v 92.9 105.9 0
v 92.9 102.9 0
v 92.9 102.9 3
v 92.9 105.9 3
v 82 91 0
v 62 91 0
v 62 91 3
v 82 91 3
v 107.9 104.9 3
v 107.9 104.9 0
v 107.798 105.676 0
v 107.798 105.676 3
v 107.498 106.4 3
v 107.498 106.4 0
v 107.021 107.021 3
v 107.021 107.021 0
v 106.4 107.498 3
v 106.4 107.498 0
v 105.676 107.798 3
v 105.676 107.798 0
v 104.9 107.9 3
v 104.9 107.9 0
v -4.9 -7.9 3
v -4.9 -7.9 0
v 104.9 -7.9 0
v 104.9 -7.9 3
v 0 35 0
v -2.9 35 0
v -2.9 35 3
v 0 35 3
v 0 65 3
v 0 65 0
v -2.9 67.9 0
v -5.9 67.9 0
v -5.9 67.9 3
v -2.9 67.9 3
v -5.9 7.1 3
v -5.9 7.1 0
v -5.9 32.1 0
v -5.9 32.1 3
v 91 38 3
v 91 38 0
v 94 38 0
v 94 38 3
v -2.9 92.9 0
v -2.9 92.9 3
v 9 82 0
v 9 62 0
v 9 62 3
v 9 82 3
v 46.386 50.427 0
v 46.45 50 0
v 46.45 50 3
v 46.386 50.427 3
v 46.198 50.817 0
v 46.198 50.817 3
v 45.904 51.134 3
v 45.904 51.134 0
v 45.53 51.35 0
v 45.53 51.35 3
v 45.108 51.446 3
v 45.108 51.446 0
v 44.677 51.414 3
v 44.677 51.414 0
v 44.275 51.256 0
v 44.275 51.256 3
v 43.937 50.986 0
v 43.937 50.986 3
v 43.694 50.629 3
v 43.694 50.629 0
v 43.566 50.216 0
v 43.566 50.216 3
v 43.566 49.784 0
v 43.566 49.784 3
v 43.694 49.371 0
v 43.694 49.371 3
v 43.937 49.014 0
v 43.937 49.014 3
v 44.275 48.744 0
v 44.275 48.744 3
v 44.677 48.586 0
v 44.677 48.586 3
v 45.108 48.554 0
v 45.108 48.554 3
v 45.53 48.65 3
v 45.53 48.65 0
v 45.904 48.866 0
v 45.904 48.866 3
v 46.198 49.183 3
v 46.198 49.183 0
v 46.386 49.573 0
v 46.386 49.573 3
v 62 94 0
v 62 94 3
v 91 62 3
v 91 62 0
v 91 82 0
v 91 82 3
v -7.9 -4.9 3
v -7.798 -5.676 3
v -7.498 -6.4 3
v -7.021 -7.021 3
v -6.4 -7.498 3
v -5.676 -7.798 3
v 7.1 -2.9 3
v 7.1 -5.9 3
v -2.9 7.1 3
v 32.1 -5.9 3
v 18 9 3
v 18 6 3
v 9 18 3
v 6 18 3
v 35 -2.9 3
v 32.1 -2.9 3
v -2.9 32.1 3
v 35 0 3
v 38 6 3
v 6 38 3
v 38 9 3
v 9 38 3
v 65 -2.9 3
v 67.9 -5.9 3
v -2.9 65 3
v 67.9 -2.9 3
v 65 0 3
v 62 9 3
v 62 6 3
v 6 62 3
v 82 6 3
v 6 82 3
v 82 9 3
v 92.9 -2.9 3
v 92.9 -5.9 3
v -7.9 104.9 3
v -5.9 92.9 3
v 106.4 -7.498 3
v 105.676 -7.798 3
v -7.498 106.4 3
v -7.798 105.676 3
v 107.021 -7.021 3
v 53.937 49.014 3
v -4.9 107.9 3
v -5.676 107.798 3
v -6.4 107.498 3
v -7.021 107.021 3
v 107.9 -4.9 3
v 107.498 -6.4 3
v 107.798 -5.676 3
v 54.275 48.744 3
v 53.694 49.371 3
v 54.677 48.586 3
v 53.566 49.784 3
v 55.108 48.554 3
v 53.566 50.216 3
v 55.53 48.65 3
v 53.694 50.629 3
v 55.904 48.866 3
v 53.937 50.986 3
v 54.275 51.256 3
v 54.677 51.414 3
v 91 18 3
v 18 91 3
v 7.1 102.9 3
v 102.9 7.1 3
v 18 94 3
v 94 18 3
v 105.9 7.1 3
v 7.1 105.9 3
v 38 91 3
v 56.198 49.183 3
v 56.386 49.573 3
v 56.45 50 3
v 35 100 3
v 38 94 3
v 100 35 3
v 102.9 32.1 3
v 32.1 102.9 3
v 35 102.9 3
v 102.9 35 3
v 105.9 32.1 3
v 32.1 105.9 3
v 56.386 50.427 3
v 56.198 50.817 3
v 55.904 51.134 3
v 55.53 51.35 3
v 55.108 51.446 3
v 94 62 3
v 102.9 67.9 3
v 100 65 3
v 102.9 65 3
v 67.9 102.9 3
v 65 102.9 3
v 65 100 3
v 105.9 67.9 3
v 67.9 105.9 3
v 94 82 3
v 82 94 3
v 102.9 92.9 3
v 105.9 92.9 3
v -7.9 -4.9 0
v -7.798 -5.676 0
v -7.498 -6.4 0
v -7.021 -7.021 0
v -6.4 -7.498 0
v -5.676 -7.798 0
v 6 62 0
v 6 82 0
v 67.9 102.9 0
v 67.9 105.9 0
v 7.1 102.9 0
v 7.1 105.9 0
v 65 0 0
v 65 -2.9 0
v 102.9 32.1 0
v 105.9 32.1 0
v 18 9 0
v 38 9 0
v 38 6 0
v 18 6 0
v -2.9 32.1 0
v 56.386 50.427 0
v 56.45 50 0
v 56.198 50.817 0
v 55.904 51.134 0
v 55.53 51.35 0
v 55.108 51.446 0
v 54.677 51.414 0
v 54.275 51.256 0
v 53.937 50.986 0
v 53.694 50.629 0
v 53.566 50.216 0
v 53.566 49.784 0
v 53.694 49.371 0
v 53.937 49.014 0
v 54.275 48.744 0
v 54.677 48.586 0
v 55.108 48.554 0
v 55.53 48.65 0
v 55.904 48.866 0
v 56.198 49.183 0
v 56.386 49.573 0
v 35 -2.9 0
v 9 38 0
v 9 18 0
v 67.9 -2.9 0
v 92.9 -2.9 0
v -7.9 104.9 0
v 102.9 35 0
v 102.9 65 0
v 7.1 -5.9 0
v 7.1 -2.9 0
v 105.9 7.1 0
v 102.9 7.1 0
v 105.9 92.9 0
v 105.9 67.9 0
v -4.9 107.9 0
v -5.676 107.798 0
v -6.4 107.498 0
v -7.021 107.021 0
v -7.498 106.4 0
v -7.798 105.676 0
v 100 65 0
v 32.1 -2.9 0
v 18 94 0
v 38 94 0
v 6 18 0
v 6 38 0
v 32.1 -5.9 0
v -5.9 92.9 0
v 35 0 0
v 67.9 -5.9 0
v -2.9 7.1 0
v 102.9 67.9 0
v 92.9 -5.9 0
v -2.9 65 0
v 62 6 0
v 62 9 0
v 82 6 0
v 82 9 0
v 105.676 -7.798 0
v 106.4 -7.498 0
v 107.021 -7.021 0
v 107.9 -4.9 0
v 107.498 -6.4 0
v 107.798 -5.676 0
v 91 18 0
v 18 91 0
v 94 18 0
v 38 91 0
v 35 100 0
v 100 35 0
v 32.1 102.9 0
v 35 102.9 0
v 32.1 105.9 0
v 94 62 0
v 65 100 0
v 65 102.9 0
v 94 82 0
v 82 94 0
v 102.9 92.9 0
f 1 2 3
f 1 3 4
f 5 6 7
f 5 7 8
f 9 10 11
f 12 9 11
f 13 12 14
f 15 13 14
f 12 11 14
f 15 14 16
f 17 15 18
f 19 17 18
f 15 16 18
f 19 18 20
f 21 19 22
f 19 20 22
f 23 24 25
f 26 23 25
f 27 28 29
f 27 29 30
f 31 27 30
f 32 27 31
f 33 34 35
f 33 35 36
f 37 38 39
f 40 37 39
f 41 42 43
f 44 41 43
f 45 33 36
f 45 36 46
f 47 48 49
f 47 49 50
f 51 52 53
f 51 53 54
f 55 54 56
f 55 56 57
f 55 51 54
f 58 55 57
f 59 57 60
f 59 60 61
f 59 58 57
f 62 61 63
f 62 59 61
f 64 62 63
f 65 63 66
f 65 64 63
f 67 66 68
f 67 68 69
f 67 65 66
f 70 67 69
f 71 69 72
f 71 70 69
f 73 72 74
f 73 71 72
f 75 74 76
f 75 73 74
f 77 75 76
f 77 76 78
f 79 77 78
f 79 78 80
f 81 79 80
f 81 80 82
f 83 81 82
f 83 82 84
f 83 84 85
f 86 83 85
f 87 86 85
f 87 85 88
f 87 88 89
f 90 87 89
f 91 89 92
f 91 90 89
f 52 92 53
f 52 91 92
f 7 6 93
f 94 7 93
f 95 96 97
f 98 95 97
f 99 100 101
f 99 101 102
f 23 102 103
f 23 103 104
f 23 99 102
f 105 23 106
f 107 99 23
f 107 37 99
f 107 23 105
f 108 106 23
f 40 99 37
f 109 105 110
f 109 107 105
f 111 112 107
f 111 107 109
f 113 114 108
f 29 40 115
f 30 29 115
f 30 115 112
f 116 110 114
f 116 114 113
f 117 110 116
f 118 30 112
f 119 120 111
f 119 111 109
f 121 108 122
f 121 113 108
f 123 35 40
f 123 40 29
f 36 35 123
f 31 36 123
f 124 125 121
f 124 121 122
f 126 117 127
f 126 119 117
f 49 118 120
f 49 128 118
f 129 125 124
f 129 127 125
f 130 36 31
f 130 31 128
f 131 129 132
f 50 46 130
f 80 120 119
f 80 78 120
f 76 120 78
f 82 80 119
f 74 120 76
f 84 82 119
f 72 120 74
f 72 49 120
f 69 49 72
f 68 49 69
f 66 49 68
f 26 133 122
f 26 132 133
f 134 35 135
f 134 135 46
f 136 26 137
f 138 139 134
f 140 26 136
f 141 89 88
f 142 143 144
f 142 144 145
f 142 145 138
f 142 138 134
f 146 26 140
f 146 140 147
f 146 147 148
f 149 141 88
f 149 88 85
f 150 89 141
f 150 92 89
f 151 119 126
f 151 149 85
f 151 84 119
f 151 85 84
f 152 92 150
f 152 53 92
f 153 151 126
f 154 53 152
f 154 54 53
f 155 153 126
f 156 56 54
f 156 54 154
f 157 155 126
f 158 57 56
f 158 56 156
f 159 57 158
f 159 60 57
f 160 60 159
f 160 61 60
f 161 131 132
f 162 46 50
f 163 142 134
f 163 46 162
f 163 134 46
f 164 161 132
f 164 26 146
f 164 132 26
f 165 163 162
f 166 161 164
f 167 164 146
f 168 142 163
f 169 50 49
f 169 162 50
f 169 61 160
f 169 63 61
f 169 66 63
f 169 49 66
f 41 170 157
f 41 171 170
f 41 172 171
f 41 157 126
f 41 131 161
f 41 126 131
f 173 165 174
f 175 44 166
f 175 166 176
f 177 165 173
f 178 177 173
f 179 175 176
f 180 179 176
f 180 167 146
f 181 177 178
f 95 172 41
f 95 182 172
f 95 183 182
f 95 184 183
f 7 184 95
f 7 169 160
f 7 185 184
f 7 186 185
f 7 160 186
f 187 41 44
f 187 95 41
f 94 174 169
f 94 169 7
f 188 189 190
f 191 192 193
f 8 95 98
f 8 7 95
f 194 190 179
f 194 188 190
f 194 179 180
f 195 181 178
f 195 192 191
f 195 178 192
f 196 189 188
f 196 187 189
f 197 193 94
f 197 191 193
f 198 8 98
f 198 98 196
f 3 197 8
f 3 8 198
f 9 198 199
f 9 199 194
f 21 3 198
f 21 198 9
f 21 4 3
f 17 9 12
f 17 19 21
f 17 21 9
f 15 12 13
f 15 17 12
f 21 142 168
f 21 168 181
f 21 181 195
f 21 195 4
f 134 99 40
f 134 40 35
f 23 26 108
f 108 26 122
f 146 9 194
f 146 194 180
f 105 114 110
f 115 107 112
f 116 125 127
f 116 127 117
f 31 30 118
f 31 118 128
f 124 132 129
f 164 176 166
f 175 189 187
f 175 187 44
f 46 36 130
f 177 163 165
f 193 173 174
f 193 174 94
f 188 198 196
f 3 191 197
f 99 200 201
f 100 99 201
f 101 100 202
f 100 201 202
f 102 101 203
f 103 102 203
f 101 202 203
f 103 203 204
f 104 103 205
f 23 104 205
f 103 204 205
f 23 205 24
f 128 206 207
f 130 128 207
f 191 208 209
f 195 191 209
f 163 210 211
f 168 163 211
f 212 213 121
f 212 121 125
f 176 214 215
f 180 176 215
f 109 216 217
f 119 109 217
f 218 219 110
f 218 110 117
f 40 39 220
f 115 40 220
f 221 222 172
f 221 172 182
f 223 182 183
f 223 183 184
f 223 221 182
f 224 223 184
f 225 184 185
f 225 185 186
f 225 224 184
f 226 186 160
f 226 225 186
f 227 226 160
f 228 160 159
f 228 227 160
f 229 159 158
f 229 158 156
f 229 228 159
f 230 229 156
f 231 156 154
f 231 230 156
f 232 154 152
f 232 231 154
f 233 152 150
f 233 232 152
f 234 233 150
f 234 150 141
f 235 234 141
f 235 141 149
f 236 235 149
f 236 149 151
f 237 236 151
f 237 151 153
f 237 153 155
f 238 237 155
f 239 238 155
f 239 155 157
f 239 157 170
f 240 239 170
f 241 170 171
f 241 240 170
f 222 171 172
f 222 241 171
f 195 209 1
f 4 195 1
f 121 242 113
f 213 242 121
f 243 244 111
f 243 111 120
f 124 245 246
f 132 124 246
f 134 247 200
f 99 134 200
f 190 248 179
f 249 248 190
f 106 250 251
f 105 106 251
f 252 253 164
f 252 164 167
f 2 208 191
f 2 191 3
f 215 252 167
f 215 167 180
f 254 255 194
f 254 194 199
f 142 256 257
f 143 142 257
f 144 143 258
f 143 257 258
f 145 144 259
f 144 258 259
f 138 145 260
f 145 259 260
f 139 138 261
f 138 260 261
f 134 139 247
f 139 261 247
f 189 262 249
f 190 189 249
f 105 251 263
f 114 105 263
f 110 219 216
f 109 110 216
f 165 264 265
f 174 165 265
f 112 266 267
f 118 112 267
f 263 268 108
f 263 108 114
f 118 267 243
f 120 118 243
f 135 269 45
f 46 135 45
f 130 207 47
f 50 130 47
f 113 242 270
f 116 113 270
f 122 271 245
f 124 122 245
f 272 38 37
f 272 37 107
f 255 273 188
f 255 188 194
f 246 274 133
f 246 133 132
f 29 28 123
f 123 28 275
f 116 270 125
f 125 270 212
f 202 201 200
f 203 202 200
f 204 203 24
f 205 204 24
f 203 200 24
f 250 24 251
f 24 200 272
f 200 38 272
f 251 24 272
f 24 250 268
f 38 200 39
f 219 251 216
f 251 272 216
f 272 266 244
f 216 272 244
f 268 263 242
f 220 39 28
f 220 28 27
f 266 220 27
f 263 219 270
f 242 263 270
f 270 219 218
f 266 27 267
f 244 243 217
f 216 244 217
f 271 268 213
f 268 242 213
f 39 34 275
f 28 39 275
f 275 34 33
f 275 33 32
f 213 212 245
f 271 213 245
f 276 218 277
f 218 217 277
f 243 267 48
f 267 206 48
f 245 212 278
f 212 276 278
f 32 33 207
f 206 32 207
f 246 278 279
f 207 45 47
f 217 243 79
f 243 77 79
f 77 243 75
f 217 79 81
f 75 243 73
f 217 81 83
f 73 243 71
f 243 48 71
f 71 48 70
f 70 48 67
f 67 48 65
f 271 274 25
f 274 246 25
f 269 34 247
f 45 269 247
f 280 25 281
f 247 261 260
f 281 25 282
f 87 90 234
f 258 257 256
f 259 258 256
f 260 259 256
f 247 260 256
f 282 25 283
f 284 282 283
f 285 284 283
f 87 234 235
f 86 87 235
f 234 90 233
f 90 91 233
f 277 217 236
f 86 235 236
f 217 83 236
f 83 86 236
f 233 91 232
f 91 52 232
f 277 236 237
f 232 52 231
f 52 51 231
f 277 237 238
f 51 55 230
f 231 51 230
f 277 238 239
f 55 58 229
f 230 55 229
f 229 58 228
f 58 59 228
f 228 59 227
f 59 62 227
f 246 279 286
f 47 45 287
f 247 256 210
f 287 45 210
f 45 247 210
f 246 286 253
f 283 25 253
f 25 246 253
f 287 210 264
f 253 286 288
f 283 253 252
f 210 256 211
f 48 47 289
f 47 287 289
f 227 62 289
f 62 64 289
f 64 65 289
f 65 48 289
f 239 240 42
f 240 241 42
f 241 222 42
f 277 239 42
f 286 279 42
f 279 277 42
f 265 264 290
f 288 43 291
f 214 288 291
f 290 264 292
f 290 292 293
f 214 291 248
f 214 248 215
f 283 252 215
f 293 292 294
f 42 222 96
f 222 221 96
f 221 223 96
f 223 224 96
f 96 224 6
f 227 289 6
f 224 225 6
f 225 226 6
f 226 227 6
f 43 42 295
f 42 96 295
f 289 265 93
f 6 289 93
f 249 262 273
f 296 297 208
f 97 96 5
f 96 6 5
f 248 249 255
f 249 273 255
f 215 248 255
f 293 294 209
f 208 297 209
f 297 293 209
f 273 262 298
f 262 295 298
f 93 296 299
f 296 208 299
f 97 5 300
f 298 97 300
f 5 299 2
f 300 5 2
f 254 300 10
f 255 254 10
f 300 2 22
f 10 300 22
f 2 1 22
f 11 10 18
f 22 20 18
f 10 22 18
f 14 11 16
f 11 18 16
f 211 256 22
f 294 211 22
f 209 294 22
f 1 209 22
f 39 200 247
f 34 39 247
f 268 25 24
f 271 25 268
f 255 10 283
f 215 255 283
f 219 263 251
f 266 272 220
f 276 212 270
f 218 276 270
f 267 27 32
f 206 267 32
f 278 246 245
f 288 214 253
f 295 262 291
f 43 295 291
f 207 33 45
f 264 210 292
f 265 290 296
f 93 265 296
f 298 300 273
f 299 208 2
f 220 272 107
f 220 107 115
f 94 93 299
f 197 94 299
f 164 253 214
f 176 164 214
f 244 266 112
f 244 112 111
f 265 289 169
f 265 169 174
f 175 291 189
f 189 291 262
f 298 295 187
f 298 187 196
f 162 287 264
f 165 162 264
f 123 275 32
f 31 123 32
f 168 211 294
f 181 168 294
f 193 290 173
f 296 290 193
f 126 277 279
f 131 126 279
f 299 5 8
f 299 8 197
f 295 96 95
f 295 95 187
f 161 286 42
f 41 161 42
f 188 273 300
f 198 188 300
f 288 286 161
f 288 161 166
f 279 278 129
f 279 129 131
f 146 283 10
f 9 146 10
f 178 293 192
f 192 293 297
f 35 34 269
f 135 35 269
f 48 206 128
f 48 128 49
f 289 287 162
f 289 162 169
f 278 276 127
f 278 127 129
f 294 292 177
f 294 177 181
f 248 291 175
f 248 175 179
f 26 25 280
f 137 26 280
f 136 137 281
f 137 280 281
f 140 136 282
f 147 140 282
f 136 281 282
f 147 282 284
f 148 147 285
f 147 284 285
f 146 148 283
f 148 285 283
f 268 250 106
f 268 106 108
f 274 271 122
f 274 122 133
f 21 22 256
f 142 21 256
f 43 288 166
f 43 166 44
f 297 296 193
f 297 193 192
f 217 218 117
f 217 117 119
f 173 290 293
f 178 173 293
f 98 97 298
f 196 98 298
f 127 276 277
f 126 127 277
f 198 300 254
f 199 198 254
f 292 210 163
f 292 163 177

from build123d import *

# Parameters (mm, degrees)
SKETCH_1_R      = 1.45
SKETCH_1_W      = 25
SKETCH_1_H      = 3
SKETCH_1_W_2    = 3
SKETCH_1_H_2    = 25
SKETCH_1_W_3    = 20
SKETCH_1_H_3    = 20
SKETCH_1_W_4    = 30
SKETCH_1_H_4    = 2.9
SKETCH_1_W_5    = 2.9
SKETCH_1_H_5    = 30
EXTRUDE_2_DEPTH = 3


with BuildPart() as part:
    # 草图1 → 凸台-拉伸2 (new body)
    with BuildSketch(Plane.XY):
        with BuildLine():
            Line((104.9, 107.9), (-4.9, 107.9))
            ThreePointArc((-4.9, 107.9), (-7.021320344, 107.021320344), (-7.9, 104.9))
            Line((-7.9, 104.9), (-7.9, -4.9))
            ThreePointArc((-7.9, -4.9), (-7.021320344, -7.021320344), (-4.9, -7.9))
            Line((-4.9, -7.9), (104.9, -7.9))
            ThreePointArc((104.9, -7.9), (107.021320344, -7.021320344), (107.9, -4.9))
            Line((107.9, -4.9), (107.9, 104.9))
            ThreePointArc((107.9, 104.9), (107.021320344, 107.021320344), (104.9, 107.9))
        make_face()
        with Locations((45, 50)):
            Circle(SKETCH_1_R, mode=Mode.SUBTRACT)
        with Locations((55, 50)):
            Circle(SKETCH_1_R, mode=Mode.SUBTRACT)
        with Locations((19.6, -4.4)):
            Rectangle(SKETCH_1_W, SKETCH_1_H, mode=Mode.SUBTRACT)
        with Locations((-4.4, 19.6)):
            Rectangle(SKETCH_1_W_2, SKETCH_1_H_2, mode=Mode.SUBTRACT)
        with Locations((28, 7.5)):
            Rectangle(SKETCH_1_W_3, SKETCH_1_H, mode=Mode.SUBTRACT)
        with Locations((7.5, 28)):
            Rectangle(SKETCH_1_W_2, SKETCH_1_H_3, mode=Mode.SUBTRACT)
        with Locations((50, -1.45)):
            Rectangle(SKETCH_1_W_4, SKETCH_1_H_4, mode=Mode.SUBTRACT)
        with Locations((72, 7.5)):
            Rectangle(SKETCH_1_W_3, SKETCH_1_H, mode=Mode.SUBTRACT)
        with Locations((80.4, -4.4)):
            Rectangle(SKETCH_1_W, SKETCH_1_H, mode=Mode.SUBTRACT)
        with Locations((104.4, 19.6)):
            Rectangle(SKETCH_1_W_2, SKETCH_1_H_2, mode=Mode.SUBTRACT)
        with Locations((92.5, 28)):
            Rectangle(SKETCH_1_W_2, SKETCH_1_H_3, mode=Mode.SUBTRACT)
        with Locations((-1.45, 50)):
            Rectangle(SKETCH_1_W_5, SKETCH_1_H_5, mode=Mode.SUBTRACT)
        with Locations((7.5, 72)):
            Rectangle(SKETCH_1_W_2, SKETCH_1_H_3, mode=Mode.SUBTRACT)
        with Locations((-4.4, 80.4)):
            Rectangle(SKETCH_1_W_2, SKETCH_1_H_2, mode=Mode.SUBTRACT)
        with Locations((19.6, 104.4)):
            Rectangle(SKETCH_1_W, SKETCH_1_H, mode=Mode.SUBTRACT)
        with Locations((28, 92.5)):
            Rectangle(SKETCH_1_W_3, SKETCH_1_H, mode=Mode.SUBTRACT)
        with Locations((80.4, 104.4)):
            Rectangle(SKETCH_1_W, SKETCH_1_H, mode=Mode.SUBTRACT)
        with Locations((101.45, 50)):
            Rectangle(SKETCH_1_W_5, SKETCH_1_H_5, mode=Mode.SUBTRACT)
        with Locations((92.5, 72)):
            Rectangle(SKETCH_1_W_2, SKETCH_1_H_3, mode=Mode.SUBTRACT)
        with Locations((72, 92.5)):
            Rectangle(SKETCH_1_W_3, SKETCH_1_H, mode=Mode.SUBTRACT)
        with Locations((50, 101.45)):
            Rectangle(SKETCH_1_W_4, SKETCH_1_H_4, mode=Mode.SUBTRACT)
        with Locations((104.4, 80.4)):
            Rectangle(SKETCH_1_W_2, SKETCH_1_H_2, mode=Mode.SUBTRACT)
    extrude(amount=EXTRUDE_2_DEPTH)


solid = part.part
